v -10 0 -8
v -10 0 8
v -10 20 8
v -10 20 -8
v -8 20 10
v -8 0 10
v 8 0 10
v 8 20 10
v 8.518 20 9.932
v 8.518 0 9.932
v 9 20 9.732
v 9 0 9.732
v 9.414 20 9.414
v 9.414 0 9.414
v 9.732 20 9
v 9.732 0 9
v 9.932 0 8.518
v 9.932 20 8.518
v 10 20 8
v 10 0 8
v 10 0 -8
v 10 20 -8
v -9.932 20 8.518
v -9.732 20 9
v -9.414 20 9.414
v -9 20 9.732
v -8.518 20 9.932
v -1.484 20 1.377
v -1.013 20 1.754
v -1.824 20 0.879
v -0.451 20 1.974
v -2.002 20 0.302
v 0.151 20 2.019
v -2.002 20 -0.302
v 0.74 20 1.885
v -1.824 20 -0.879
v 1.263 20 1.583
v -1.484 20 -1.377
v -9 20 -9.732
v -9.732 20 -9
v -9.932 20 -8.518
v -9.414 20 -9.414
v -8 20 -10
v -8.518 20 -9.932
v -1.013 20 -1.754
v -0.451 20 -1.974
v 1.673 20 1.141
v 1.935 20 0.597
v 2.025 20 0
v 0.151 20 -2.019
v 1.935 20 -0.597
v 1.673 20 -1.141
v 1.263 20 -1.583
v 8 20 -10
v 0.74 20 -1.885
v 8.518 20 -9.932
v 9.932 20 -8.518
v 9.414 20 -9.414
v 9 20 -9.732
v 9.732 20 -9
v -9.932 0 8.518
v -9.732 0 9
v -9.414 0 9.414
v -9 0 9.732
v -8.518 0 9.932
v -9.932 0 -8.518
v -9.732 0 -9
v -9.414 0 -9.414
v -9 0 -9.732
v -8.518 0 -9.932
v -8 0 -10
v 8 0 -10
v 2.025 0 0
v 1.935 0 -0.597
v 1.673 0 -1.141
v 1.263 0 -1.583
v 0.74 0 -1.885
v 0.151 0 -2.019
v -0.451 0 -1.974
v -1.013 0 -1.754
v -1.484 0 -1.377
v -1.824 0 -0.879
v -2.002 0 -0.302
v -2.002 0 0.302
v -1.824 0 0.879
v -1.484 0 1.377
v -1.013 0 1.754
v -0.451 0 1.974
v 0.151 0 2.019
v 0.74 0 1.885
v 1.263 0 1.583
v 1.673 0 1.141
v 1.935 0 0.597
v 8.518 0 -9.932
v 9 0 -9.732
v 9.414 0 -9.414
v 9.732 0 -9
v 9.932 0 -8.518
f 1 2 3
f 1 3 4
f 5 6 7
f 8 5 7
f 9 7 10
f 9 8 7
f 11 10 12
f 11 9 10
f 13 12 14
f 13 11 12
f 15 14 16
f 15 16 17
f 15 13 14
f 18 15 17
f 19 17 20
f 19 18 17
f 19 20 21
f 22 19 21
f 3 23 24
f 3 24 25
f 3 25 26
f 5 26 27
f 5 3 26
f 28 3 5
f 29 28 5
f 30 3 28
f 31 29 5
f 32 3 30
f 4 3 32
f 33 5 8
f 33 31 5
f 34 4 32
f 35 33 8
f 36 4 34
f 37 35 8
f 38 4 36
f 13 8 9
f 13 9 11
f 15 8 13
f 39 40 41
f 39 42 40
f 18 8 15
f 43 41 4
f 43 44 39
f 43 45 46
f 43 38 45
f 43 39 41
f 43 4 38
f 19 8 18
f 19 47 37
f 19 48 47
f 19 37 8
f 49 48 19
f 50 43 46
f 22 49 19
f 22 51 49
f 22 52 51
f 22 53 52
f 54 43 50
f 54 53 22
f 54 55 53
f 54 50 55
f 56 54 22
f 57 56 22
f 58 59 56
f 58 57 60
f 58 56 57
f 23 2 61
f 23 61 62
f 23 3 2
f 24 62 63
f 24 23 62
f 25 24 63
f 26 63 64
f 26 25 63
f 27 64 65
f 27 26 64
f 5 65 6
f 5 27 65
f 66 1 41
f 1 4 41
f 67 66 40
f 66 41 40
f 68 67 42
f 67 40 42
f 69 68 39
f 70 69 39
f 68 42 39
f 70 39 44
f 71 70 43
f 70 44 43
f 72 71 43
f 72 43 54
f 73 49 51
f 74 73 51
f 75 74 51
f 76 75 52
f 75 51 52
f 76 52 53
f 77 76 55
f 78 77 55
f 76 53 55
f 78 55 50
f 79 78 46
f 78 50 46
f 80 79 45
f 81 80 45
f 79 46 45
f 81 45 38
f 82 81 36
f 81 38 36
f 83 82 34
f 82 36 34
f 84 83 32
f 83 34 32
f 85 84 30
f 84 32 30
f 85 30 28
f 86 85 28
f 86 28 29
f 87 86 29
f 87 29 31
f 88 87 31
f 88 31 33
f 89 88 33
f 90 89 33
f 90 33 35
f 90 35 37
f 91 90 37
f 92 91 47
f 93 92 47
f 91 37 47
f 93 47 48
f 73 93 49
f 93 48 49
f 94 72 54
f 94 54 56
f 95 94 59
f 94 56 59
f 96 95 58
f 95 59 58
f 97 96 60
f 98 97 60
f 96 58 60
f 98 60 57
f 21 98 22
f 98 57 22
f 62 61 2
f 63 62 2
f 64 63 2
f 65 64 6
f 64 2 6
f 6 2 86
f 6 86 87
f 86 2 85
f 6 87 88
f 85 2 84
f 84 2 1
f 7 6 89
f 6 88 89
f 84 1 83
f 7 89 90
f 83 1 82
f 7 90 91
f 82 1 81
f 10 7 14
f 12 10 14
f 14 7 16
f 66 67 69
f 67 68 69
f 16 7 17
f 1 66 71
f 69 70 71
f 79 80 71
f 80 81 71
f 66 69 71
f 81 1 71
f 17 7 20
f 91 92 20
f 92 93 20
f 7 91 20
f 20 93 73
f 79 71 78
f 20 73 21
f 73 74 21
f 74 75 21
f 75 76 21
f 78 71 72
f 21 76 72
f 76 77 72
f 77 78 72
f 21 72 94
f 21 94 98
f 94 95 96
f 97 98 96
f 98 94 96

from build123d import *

# Parameters (mm, degrees)
SKETCH_1_W          = 20
SKETCH_1_H          = 20
EXTRUDE_1_DEPTH     = 20
SKETCH_2_R          = 2.025
CUT_EXTRUDE_1_DEPTH = 20
FILLET_1_R          = 2


with BuildPart() as part:
    # 草图1 → 凸台-拉伸1 (new body)
    with BuildSketch(Plane(origin=(0, 0, 0), x_dir=(1, 0, 0), z_dir=(0, 1, 0))):
        Rectangle(SKETCH_1_W, SKETCH_1_H)
    extrude(amount=EXTRUDE_1_DEPTH)

    # 草图2 → 切除-拉伸1 (cut)
    with BuildSketch(Plane(origin=(0, 20, 0), x_dir=(1, 0, 0), z_dir=(0, 1, 0))):
        Circle(SKETCH_2_R)
    extrude(amount=-CUT_EXTRUDE_1_DEPTH, mode=Mode.SUBTRACT)

    # 圆角1
    fillet_1_edges = [part.edges().sort_by_distance(p)[0] for p in [
        (10, 10, 10),
        (-10, 10, 10),
        (-10, 10, -10),
        (10, 10, -10),
    ]]
    fillet(fillet_1_edges, radius=FILLET_1_R)


solid = part.part
